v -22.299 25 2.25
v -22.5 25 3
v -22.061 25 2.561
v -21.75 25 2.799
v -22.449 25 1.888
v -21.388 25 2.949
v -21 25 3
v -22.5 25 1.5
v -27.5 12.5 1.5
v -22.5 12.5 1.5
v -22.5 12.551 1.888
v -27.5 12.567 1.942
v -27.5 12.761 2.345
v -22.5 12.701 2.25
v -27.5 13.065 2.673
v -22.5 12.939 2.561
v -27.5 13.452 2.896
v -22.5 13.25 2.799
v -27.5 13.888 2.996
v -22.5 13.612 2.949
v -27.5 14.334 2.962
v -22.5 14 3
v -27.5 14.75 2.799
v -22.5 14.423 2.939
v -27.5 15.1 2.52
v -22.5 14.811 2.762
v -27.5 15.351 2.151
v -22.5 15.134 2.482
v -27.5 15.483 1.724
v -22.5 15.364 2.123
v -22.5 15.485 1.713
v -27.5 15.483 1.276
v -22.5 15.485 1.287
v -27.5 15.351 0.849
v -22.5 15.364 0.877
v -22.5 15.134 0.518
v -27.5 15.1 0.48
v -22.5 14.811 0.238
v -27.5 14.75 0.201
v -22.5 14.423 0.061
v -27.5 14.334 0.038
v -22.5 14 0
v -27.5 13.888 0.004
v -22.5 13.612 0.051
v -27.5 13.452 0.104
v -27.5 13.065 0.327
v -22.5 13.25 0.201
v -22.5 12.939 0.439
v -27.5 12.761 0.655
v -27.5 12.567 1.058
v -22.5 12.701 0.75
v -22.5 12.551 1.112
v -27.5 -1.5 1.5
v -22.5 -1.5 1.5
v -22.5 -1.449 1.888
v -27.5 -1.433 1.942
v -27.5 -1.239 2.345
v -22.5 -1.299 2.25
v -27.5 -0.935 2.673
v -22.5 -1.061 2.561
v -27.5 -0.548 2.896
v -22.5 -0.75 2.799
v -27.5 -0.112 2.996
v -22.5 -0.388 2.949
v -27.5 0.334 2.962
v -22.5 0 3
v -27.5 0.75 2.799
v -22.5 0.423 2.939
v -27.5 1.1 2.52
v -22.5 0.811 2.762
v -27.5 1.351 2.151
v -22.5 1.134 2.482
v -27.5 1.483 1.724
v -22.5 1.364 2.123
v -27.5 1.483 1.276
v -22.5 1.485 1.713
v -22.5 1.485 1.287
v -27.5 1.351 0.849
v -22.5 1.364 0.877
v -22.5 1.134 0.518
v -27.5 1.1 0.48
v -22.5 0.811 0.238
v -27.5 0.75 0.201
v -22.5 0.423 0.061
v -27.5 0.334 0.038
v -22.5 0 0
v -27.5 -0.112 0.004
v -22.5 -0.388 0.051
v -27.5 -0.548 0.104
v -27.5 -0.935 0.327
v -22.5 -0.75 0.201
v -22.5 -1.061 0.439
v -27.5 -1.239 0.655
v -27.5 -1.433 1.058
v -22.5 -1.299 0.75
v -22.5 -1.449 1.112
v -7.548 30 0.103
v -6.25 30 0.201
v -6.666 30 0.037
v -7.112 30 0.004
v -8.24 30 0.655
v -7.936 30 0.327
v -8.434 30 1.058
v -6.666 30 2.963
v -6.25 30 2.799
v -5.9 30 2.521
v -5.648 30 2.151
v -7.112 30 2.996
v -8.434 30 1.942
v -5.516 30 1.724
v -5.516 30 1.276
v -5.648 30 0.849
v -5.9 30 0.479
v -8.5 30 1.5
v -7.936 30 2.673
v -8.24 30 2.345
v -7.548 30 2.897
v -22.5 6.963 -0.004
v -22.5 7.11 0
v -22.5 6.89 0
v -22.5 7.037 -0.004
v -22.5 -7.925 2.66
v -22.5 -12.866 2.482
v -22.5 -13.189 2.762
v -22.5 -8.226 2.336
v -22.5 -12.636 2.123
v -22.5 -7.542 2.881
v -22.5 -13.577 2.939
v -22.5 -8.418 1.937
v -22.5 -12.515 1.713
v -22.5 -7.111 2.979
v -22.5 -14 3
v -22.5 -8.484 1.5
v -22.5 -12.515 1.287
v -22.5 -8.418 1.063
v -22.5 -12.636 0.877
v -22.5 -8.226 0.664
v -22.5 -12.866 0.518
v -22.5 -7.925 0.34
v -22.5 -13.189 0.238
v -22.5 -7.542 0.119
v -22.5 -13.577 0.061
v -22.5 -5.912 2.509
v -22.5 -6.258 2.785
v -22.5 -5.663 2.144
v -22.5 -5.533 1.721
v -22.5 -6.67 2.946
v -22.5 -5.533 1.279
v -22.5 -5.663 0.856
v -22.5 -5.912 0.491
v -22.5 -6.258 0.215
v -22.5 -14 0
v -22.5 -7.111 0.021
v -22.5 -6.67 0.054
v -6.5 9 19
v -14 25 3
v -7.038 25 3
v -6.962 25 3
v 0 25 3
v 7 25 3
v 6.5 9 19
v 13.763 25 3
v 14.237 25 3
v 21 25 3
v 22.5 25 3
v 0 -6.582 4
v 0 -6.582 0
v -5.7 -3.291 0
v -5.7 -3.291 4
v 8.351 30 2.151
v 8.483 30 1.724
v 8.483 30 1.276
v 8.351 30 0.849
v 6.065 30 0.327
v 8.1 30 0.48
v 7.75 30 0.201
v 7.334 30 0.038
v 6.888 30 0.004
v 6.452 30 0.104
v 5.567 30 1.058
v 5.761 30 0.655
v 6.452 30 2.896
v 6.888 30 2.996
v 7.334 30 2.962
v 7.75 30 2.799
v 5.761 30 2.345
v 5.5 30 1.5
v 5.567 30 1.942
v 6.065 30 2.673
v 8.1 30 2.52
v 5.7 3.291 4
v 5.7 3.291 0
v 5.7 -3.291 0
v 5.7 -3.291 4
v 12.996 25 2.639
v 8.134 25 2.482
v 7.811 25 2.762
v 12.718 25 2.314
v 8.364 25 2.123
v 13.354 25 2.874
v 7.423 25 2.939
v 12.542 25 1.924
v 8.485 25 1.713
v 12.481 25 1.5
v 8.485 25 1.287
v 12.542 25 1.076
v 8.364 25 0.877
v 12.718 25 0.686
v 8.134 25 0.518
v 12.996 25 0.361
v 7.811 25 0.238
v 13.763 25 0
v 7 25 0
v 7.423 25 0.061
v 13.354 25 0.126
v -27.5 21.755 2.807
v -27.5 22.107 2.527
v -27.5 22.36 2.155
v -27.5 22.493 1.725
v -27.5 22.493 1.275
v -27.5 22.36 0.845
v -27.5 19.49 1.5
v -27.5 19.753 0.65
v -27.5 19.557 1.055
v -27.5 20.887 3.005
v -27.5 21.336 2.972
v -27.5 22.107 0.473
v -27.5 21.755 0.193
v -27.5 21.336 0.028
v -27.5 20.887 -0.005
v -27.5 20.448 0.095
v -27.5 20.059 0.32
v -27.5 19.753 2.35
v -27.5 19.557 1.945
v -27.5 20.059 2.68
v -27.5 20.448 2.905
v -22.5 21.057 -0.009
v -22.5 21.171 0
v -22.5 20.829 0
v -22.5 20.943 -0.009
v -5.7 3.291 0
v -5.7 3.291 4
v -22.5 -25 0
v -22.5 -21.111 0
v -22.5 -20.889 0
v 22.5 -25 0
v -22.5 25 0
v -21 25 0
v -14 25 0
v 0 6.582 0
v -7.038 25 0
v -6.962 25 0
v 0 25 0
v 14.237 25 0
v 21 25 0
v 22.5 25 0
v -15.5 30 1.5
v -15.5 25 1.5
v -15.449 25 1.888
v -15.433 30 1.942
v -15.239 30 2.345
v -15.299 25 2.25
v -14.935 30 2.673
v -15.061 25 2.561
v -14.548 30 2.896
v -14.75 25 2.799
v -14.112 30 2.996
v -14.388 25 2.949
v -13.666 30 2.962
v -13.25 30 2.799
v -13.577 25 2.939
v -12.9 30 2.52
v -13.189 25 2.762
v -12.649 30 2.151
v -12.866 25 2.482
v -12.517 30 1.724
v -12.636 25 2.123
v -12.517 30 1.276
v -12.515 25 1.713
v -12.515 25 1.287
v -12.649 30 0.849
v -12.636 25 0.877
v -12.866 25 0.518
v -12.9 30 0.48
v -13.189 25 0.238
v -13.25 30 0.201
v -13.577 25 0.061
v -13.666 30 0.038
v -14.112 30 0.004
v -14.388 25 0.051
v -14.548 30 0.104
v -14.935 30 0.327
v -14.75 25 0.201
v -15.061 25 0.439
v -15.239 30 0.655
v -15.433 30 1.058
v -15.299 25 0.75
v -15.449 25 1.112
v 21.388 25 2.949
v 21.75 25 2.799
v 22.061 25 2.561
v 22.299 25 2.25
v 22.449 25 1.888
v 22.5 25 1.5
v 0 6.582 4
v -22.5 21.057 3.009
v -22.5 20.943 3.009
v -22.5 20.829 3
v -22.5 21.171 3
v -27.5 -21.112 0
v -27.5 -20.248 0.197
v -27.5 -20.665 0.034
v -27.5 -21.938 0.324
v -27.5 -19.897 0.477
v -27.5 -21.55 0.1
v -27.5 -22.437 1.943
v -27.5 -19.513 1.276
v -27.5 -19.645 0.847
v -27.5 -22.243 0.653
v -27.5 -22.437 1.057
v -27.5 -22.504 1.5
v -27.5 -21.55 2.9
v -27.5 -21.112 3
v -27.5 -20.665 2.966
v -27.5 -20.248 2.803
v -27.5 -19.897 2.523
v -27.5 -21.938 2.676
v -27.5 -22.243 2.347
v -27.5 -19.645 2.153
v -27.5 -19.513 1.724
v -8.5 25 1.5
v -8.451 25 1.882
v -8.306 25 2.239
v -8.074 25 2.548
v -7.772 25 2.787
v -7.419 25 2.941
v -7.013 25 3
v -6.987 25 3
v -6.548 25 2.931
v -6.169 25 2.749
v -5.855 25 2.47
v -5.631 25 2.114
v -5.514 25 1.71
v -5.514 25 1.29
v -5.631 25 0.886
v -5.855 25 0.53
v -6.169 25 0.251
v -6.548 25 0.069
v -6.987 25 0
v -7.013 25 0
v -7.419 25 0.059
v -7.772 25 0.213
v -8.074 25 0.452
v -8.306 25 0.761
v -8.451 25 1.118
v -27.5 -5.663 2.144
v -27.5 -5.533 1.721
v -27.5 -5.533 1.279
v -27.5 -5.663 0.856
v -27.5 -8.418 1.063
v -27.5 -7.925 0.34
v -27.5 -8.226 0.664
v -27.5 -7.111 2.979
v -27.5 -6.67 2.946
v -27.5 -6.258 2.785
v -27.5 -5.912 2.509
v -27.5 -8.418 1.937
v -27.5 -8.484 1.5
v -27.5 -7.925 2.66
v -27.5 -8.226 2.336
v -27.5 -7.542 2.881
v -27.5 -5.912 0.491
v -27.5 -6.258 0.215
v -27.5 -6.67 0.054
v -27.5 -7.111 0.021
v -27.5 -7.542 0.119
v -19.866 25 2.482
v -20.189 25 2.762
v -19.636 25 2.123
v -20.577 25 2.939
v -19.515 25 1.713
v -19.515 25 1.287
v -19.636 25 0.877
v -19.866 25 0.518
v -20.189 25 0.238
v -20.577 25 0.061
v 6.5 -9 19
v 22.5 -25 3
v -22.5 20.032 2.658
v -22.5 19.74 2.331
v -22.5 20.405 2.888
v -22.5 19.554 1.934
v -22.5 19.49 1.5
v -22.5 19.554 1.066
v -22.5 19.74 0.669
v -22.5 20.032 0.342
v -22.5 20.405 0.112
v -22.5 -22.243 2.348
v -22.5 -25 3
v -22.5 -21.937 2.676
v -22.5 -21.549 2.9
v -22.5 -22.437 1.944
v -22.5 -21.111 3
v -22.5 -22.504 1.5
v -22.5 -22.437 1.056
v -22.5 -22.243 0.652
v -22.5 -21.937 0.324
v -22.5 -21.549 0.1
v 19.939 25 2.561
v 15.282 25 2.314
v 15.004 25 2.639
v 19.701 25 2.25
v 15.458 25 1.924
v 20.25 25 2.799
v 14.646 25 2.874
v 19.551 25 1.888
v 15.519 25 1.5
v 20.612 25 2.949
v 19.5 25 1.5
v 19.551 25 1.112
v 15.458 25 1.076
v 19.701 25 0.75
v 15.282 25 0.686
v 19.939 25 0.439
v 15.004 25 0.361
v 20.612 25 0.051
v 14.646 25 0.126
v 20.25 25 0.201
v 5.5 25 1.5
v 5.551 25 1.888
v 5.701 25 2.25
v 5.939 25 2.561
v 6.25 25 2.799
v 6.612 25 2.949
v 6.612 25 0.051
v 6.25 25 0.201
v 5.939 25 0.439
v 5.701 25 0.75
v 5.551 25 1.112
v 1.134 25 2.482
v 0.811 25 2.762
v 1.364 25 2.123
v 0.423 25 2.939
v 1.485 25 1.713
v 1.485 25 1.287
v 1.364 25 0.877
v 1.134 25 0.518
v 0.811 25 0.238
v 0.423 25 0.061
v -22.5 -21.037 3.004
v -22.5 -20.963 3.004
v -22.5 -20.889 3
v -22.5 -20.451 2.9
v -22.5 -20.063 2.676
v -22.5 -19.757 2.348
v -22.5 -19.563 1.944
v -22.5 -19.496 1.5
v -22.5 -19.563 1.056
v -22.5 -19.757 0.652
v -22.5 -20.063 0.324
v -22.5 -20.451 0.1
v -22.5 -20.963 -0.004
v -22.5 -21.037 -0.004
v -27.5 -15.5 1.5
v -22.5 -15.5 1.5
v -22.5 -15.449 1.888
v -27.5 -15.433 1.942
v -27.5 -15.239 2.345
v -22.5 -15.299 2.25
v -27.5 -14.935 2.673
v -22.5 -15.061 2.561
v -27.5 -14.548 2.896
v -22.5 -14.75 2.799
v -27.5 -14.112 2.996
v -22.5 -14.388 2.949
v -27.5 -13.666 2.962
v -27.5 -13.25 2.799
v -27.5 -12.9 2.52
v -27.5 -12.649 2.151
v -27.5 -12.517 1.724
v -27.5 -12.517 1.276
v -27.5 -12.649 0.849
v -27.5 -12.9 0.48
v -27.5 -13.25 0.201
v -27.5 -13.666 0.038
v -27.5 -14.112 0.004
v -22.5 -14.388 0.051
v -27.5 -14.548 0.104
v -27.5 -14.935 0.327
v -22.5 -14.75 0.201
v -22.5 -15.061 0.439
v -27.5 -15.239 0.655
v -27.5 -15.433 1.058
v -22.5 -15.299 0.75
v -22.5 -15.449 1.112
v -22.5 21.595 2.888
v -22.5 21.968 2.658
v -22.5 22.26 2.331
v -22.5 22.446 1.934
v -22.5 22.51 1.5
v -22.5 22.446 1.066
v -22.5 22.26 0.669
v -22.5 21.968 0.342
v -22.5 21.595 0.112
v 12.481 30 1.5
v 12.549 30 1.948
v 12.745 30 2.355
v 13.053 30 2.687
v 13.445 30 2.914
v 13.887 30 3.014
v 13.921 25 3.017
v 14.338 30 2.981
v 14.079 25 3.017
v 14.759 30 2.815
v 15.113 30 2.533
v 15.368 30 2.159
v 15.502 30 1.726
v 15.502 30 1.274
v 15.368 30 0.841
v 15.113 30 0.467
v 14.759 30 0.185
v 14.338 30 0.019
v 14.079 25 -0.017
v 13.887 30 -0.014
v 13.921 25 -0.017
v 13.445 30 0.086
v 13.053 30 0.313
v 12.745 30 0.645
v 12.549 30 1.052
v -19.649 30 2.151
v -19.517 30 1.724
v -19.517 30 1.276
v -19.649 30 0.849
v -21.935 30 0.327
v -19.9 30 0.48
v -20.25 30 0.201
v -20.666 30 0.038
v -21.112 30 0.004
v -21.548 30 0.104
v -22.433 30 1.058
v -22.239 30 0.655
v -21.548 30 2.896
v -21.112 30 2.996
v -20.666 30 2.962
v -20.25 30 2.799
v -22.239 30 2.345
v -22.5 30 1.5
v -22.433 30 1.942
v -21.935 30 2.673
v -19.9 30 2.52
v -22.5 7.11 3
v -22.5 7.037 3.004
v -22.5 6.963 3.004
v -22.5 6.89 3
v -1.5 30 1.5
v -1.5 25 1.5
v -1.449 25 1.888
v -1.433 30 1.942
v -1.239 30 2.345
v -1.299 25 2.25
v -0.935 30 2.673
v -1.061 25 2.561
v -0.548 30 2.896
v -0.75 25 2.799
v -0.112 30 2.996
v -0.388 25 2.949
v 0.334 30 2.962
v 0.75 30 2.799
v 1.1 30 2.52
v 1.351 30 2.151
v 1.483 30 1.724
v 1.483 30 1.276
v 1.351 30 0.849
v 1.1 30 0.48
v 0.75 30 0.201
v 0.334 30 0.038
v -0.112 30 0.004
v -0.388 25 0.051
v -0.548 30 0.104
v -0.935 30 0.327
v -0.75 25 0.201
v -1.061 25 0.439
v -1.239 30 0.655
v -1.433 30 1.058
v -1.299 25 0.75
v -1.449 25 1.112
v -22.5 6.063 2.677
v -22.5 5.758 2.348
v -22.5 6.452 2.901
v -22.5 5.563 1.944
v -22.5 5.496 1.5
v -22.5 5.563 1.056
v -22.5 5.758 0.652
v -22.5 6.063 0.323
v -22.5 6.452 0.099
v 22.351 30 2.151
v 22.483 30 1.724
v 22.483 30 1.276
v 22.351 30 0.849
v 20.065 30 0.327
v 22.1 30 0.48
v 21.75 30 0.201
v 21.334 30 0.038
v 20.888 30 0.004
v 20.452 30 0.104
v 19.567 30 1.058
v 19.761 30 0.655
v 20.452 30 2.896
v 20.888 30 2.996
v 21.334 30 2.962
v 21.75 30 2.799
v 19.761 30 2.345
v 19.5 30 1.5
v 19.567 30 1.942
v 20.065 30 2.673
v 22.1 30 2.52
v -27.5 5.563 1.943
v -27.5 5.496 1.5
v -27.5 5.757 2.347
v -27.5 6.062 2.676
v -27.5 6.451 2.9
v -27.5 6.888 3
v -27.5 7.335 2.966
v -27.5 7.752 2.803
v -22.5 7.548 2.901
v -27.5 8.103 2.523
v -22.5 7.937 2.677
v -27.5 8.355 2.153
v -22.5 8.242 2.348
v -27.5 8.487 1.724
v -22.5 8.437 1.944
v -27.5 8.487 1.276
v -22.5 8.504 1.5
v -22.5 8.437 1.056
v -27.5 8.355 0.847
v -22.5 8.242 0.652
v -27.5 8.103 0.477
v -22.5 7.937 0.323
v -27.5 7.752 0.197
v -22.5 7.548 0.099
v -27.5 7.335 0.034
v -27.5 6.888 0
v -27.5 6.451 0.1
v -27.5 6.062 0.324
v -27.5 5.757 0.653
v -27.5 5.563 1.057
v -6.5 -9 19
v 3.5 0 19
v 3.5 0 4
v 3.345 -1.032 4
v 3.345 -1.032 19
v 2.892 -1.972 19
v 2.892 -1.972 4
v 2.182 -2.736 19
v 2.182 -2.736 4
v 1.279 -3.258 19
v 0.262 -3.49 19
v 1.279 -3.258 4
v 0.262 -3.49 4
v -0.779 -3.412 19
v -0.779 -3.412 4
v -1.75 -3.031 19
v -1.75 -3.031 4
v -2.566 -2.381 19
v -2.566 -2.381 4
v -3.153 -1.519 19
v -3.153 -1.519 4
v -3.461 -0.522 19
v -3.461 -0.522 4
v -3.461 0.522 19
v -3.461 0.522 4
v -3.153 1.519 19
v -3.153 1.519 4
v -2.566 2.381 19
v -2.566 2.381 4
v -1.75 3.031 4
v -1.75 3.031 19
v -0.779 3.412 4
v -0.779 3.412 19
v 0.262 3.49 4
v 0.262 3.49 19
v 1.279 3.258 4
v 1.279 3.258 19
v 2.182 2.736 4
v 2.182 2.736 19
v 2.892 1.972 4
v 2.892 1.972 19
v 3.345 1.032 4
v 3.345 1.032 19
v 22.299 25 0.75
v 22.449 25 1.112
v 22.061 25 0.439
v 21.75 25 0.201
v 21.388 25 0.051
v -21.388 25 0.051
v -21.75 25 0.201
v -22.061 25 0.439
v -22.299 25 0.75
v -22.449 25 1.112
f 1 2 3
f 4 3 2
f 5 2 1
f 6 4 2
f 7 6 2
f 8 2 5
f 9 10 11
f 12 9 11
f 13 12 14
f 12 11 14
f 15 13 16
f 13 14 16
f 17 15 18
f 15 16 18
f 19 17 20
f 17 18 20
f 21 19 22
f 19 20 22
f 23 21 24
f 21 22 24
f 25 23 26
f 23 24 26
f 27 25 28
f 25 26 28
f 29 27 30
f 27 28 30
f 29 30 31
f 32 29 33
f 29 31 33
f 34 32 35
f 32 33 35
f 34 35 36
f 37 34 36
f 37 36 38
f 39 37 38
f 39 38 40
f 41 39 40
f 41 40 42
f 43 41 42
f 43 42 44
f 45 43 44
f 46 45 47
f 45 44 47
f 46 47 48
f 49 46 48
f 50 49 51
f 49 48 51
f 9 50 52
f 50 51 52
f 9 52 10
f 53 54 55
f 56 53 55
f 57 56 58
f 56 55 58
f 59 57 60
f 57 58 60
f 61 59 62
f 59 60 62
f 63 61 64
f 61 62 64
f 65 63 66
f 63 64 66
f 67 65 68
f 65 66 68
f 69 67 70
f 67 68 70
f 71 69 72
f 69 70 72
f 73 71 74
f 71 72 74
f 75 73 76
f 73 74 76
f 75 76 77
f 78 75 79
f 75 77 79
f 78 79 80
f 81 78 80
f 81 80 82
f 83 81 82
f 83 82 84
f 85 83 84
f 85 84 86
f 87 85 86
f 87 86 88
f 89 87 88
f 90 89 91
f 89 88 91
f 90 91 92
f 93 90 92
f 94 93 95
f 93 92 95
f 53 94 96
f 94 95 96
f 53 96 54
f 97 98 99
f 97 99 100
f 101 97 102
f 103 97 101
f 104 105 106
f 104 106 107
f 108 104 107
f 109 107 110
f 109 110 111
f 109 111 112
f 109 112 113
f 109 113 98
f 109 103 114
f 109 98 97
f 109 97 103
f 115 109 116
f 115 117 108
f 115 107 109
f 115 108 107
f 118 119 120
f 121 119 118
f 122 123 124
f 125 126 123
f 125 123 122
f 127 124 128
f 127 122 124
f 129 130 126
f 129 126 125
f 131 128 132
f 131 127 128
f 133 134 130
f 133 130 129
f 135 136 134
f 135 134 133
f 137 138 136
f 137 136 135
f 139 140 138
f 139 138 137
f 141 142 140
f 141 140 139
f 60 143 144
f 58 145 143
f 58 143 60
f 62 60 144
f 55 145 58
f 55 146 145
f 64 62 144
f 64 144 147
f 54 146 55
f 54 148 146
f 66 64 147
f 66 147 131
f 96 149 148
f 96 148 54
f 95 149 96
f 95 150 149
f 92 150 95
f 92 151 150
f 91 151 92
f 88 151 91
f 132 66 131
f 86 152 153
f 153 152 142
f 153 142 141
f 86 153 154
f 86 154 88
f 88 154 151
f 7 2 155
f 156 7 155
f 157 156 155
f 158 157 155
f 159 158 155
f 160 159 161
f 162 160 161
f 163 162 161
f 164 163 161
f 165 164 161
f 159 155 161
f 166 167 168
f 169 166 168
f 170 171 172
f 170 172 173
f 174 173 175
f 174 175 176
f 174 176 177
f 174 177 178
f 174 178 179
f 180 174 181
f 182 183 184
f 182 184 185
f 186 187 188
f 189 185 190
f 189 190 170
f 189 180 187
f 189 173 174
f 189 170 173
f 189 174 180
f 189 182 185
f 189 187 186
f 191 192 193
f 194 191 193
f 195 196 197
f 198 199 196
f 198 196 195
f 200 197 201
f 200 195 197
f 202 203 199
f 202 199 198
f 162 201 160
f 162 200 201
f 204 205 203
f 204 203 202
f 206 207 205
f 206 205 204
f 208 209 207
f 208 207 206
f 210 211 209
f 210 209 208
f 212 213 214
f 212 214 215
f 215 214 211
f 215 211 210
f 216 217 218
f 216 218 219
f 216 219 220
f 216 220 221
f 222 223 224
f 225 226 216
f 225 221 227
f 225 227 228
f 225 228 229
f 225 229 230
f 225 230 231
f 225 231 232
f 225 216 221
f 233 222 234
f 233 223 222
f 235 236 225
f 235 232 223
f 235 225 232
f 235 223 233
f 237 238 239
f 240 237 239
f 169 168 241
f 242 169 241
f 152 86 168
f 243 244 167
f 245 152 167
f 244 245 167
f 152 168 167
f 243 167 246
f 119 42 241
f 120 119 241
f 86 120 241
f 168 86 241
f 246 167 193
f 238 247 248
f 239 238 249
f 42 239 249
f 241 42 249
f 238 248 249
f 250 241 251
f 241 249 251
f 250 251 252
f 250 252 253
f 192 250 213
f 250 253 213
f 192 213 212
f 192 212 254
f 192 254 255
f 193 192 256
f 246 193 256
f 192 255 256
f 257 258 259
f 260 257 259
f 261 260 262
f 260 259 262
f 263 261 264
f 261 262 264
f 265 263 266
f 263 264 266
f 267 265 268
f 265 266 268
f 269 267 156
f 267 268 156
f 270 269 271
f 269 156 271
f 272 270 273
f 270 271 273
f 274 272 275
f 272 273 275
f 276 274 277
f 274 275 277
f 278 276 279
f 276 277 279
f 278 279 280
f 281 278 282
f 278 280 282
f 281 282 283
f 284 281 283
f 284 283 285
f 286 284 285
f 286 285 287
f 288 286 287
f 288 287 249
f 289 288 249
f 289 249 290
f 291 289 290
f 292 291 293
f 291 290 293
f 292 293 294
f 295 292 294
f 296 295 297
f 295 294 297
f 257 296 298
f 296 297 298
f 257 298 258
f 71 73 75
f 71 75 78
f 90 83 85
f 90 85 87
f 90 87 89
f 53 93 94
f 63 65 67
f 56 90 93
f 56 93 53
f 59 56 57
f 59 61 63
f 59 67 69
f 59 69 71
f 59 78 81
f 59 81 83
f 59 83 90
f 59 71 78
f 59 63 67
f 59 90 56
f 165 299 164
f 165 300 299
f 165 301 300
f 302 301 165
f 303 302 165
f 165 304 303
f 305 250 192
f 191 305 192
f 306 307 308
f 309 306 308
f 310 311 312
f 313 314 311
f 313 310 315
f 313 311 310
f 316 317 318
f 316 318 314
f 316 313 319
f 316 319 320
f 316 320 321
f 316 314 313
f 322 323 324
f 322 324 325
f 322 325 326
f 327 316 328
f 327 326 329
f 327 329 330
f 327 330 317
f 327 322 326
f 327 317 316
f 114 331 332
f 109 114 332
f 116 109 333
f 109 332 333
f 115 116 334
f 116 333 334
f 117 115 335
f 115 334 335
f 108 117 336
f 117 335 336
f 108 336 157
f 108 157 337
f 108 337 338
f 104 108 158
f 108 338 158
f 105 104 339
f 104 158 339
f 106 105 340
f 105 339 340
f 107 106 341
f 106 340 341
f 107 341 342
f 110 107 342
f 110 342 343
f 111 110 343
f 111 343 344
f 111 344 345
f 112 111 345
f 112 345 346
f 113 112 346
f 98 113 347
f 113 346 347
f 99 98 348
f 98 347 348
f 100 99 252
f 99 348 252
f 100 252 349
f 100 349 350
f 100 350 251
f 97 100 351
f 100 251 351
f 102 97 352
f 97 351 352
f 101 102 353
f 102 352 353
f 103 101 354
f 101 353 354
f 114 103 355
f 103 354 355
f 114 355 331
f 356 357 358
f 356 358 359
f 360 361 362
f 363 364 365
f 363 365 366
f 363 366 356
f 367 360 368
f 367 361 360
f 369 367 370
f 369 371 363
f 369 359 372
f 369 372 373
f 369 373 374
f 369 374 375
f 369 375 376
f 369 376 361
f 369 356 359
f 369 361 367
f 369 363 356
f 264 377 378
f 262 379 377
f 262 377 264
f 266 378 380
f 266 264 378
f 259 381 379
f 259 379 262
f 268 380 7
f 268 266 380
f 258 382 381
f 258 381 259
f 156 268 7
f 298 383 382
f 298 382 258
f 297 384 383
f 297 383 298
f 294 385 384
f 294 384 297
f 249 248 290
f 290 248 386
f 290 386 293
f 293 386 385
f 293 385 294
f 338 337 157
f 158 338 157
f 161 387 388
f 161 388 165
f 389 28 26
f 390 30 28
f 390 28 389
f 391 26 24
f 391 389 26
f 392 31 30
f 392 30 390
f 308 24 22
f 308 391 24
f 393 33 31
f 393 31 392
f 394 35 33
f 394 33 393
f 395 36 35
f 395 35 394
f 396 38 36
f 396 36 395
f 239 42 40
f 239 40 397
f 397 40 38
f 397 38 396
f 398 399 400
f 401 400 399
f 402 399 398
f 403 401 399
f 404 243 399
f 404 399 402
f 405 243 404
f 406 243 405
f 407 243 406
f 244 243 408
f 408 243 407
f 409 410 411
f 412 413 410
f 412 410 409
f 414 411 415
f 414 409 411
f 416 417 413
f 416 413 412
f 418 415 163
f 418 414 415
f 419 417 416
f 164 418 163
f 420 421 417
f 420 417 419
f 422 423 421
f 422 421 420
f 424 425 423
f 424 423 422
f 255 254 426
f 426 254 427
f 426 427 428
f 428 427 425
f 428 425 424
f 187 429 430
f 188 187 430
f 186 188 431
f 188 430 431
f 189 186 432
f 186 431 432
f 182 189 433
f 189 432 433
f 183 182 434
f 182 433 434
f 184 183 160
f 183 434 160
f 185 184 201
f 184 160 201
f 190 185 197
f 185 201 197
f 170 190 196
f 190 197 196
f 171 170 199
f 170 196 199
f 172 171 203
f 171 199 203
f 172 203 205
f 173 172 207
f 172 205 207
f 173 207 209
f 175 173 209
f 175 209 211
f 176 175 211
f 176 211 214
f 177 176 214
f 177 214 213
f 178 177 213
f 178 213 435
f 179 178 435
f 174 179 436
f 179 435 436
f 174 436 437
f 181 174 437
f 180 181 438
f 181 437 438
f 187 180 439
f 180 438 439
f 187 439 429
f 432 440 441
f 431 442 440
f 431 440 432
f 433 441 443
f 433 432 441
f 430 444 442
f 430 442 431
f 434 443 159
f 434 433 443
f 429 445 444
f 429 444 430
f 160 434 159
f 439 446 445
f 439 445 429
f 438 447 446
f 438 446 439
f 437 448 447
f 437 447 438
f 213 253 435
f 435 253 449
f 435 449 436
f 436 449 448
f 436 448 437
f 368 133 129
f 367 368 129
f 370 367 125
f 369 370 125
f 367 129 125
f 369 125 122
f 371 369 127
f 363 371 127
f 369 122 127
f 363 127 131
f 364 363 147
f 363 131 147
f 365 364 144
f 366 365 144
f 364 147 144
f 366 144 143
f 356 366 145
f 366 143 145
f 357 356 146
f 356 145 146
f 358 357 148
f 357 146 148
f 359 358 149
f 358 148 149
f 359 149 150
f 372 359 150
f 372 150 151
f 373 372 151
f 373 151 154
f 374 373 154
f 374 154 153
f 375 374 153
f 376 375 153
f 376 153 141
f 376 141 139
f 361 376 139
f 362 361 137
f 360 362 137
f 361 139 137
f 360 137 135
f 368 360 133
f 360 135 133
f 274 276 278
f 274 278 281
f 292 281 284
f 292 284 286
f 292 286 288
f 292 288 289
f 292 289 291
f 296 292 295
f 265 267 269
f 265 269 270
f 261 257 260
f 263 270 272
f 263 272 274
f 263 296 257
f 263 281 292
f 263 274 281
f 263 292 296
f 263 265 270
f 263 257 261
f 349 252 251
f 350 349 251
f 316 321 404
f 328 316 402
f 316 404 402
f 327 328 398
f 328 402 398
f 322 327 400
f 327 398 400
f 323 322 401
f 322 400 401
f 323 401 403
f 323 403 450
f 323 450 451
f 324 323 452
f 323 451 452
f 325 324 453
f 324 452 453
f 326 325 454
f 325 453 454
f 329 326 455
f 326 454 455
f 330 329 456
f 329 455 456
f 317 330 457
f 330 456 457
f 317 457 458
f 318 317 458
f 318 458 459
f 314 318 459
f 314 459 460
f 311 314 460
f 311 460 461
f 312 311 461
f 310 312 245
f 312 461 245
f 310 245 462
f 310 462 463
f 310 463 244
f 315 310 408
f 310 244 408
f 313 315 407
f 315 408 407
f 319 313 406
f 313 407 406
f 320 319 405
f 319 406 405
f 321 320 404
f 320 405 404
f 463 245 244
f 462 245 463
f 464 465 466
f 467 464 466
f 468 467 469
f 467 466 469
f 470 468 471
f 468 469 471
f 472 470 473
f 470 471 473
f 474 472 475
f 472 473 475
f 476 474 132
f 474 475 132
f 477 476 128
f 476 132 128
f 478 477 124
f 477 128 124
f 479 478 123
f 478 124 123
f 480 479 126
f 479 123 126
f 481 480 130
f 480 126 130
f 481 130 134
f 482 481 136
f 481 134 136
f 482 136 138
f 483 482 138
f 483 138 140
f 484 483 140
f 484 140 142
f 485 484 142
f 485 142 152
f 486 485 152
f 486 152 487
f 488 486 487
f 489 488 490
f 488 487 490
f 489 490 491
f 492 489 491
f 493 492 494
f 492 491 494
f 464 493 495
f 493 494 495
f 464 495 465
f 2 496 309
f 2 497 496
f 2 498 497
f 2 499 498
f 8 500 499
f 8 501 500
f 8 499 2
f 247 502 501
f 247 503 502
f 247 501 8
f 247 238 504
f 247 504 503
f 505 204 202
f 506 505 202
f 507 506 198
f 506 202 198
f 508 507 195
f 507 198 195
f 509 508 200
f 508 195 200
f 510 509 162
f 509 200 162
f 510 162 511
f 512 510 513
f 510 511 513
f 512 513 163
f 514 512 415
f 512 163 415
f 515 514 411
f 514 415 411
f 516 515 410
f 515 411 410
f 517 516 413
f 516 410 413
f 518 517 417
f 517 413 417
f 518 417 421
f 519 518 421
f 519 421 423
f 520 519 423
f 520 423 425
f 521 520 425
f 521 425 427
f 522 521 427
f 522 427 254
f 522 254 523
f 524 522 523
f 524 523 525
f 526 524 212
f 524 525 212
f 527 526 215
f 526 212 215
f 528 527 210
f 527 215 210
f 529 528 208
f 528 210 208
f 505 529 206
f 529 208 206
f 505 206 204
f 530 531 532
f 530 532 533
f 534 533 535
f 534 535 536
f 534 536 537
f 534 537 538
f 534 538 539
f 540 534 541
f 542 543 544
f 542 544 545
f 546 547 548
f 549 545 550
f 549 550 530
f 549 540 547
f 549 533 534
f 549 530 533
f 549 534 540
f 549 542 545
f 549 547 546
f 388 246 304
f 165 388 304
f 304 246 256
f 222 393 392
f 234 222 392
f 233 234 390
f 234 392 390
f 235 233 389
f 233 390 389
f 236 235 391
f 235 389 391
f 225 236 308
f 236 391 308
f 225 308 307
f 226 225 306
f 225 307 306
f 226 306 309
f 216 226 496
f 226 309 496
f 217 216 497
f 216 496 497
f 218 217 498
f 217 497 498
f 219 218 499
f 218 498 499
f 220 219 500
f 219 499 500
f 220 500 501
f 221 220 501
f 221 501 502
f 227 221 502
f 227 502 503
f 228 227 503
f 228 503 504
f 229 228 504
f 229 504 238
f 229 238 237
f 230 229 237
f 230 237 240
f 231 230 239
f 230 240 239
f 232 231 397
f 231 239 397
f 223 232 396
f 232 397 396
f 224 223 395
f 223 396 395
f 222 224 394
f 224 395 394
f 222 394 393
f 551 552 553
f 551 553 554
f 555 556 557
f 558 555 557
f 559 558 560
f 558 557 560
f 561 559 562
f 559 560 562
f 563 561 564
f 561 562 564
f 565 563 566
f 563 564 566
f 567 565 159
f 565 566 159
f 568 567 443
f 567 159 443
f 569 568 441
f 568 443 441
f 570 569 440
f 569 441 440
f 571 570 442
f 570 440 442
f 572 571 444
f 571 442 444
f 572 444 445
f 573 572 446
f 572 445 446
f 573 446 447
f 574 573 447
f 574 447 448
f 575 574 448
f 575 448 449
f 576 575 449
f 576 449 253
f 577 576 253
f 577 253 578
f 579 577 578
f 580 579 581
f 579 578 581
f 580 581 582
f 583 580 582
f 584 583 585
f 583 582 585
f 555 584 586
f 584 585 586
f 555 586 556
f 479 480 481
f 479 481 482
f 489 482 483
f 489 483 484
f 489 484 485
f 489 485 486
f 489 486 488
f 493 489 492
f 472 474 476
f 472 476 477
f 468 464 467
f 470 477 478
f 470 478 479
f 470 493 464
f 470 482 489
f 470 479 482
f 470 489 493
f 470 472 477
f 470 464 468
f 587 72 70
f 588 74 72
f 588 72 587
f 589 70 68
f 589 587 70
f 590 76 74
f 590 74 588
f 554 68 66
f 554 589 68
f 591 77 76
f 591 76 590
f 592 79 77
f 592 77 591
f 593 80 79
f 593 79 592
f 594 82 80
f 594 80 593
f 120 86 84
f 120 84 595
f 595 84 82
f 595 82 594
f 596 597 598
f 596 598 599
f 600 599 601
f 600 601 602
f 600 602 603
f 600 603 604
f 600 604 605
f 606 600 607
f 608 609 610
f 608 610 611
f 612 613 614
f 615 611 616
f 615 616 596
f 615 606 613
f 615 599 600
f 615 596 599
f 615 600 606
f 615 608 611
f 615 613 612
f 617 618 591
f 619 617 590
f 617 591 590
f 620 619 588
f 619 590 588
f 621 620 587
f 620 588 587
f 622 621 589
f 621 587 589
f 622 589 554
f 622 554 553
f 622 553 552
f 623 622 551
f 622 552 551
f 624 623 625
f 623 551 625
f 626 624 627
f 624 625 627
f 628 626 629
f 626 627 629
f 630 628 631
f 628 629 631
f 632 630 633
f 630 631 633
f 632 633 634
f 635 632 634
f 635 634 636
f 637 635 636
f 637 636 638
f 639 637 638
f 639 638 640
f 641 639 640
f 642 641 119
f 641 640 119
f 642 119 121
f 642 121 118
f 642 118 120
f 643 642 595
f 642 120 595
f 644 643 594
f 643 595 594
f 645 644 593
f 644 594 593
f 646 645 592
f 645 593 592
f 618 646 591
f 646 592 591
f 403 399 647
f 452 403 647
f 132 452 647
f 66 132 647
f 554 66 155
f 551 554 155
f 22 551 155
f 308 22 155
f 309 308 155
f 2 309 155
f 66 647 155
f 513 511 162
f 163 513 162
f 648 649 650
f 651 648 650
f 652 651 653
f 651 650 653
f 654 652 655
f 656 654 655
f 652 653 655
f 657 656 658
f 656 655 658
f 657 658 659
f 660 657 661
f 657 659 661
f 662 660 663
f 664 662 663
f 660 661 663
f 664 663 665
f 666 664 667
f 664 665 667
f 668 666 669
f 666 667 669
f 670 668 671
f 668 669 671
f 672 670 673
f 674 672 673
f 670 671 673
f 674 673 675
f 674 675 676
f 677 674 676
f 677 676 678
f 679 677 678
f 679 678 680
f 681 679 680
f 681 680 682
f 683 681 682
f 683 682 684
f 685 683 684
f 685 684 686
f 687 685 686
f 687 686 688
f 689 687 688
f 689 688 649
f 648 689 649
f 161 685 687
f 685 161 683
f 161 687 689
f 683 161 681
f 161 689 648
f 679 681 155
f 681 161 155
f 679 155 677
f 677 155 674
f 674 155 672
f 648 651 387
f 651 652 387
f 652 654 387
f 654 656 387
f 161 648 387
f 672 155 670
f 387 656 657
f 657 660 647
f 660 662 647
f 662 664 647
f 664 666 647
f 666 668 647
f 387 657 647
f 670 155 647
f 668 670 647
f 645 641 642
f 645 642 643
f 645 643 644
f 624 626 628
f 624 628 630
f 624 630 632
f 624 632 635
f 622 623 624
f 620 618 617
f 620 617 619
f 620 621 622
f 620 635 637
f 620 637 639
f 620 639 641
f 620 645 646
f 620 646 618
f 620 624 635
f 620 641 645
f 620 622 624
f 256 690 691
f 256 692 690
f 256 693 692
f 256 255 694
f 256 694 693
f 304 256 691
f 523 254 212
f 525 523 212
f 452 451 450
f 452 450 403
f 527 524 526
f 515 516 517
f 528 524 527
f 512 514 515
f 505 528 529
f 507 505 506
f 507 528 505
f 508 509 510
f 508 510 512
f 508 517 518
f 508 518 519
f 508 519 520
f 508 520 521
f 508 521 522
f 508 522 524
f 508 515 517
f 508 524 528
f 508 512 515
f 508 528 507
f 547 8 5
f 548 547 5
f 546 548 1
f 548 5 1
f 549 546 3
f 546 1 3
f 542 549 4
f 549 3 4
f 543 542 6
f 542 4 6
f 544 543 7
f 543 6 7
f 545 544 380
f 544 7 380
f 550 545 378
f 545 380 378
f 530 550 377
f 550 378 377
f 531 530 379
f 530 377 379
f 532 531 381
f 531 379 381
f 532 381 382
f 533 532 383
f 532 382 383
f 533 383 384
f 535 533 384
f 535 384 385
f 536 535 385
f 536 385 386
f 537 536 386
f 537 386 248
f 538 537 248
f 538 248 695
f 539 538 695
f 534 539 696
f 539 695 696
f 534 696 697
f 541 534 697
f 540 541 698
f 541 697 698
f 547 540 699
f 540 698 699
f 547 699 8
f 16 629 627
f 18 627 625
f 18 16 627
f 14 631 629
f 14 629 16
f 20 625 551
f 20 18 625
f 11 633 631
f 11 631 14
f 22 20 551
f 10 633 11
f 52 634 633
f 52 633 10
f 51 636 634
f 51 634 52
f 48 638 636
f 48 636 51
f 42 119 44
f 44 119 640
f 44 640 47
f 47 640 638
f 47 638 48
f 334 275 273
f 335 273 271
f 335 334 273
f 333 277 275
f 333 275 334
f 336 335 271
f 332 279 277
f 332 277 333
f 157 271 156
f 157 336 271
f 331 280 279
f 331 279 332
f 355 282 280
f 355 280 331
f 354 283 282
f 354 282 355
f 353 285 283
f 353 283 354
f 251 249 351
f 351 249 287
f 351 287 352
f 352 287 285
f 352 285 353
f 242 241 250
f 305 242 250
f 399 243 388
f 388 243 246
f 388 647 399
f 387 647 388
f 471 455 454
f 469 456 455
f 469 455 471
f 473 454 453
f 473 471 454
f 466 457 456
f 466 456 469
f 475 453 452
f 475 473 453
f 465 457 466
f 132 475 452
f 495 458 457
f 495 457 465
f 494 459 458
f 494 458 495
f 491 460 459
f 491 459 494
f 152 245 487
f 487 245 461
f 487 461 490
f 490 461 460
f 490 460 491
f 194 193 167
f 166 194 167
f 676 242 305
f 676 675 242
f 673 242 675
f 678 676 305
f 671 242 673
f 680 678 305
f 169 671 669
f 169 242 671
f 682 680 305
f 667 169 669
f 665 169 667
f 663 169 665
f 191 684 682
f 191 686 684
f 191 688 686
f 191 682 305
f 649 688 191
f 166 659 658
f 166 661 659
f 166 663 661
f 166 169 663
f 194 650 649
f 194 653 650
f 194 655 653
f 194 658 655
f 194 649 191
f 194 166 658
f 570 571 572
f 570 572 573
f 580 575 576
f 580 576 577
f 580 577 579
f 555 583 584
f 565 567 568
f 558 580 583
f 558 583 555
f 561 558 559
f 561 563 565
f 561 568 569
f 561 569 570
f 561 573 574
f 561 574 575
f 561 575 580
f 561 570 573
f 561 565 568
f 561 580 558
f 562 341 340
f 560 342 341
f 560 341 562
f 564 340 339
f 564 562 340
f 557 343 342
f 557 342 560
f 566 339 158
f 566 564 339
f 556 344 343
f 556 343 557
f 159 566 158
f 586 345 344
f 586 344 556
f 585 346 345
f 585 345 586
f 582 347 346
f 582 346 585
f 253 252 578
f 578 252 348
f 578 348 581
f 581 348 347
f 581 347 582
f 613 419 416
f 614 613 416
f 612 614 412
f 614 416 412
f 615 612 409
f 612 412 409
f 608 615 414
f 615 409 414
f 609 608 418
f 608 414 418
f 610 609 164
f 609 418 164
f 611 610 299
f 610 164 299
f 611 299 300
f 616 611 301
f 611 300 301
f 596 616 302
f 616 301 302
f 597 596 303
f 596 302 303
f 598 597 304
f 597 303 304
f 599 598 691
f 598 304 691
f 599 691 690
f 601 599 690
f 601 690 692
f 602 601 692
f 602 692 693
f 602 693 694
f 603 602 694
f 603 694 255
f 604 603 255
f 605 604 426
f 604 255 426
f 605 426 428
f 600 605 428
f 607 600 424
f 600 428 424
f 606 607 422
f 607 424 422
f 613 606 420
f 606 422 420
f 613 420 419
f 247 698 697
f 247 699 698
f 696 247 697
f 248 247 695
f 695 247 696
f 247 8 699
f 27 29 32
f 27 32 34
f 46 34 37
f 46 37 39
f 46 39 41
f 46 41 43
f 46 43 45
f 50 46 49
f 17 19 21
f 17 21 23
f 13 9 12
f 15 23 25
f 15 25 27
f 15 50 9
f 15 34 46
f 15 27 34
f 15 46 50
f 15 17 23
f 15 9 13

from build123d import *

# Parameters (mm, degrees)
SKETCH_W        = 45
SKETCH_H        = 50
PAD_DEPTH       = 25
CHAMFER_SIZE    = 22
SKETCH001_R     = 3.5
POCKET_DEPTH    = 25.001
SKETCH002_W     = 32.700705
SKETCH002_H     = 10
POCKET001_DEPTH = 45.001
SKETCH003_R     = 1.5
SKETCH003_R_2   = 1.518583
SKETCH003_R_3   = 1.500476
PAD001_DEPTH    = 5
SKETCH004_R     = 1.5
SKETCH004_R_2   = 1.504062
SKETCH004_R_3   = 1.509717
SKETCH004_R_4   = 1.483533
SKETCH004_R_5   = 1.504121
PAD002_DEPTH    = 5
POCKET002_DEPTH = 4


with BuildPart() as part:
    # Sketch → Pad (new body)
    with BuildSketch(Plane.XY):
        Rectangle(SKETCH_W, SKETCH_H)
    extrude(amount=PAD_DEPTH)

    # Chamfer
    chamfer_edges = [part.edges().sort_by_distance(p)[0] for p in [
        (0, 25, 25),
        (-22.5, 0, 25),
        (0, -25, 25),
        (22.5, 0, 25),
    ]]
    chamfer(chamfer_edges, length=CHAMFER_SIZE)

    # Sketch001 → Pocket (cut, through all)
    with BuildSketch(Plane(origin=(0, 0, 0), x_dir=(1, 0, 0), z_dir=(0, 0, -1))):
        Circle(SKETCH001_R)
    extrude(amount=-POCKET_DEPTH, mode=Mode.SUBTRACT)

    # Sketch002 → Pocket001 (cut, through all)
    with BuildSketch(Plane(origin=(-22.5, 0, 0), x_dir=(0, -1, 0), z_dir=(-1, 0, 0))):
        with Locations((-0.350352, 24)):
            Rectangle(SKETCH002_W, SKETCH002_H)
    extrude(amount=-POCKET001_DEPTH, mode=Mode.SUBTRACT)

    # Sketch003 → Pad001 (new body)
    with BuildSketch(Plane(origin=(0, 25, 0), x_dir=(-1, 0, 0), z_dir=(0, 1, 0))):
        with Locations((-21, 1.5)):
            Circle(SKETCH003_R)
        with Locations((-14, 1.5)):
            Circle(SKETCH003_R_2)
        with Locations((0, 1.5)):
            Circle(SKETCH003_R)
        with Locations((-7, 1.5)):
            Circle(SKETCH003_R)
        with Locations((7, 1.5)):
            Circle(SKETCH003_R_3)
        with Locations((14, 1.5)):
            Circle(SKETCH003_R)
        with Locations((21, 1.5)):
            Circle(SKETCH003_R)
    extrude(amount=PAD001_DEPTH)

    # Sketch004 → Pad002 (new body)
    with BuildSketch(Plane(origin=(-22.5, 0, 0), x_dir=(0, -1, 0), z_dir=(-1, 0, 0))):
        with Locations((0, 1.5)):
            Circle(SKETCH004_R)
        with Locations((-7, 1.5)):
            Circle(SKETCH004_R_2)
        with Locations((-14, 1.5)):
            Circle(SKETCH004_R)
        with Locations((-21, 1.5)):
            Circle(SKETCH004_R_3)
        with Locations((7, 1.5)):
            Circle(SKETCH004_R_4)
        with Locations((14, 1.5)):
            Circle(SKETCH004_R)
        with Locations((21, 1.5)):
            Circle(SKETCH004_R_5)
    extrude(amount=PAD002_DEPTH)

    # Sketch005 → Pocket002 (cut)
    with BuildSketch(Plane(origin=(0, 0, 0), x_dir=(1, 0, 0), z_dir=(0, 0, -1))):
        Polygon((5.7, -3.290897), (5.7, 3.290897), (0, 6.581793), (-5.7, 3.290897), (-5.7, -3.290897), (0, -6.581793), align=None)
    extrude(amount=-POCKET002_DEPTH, mode=Mode.SUBTRACT)


solid = part.part
